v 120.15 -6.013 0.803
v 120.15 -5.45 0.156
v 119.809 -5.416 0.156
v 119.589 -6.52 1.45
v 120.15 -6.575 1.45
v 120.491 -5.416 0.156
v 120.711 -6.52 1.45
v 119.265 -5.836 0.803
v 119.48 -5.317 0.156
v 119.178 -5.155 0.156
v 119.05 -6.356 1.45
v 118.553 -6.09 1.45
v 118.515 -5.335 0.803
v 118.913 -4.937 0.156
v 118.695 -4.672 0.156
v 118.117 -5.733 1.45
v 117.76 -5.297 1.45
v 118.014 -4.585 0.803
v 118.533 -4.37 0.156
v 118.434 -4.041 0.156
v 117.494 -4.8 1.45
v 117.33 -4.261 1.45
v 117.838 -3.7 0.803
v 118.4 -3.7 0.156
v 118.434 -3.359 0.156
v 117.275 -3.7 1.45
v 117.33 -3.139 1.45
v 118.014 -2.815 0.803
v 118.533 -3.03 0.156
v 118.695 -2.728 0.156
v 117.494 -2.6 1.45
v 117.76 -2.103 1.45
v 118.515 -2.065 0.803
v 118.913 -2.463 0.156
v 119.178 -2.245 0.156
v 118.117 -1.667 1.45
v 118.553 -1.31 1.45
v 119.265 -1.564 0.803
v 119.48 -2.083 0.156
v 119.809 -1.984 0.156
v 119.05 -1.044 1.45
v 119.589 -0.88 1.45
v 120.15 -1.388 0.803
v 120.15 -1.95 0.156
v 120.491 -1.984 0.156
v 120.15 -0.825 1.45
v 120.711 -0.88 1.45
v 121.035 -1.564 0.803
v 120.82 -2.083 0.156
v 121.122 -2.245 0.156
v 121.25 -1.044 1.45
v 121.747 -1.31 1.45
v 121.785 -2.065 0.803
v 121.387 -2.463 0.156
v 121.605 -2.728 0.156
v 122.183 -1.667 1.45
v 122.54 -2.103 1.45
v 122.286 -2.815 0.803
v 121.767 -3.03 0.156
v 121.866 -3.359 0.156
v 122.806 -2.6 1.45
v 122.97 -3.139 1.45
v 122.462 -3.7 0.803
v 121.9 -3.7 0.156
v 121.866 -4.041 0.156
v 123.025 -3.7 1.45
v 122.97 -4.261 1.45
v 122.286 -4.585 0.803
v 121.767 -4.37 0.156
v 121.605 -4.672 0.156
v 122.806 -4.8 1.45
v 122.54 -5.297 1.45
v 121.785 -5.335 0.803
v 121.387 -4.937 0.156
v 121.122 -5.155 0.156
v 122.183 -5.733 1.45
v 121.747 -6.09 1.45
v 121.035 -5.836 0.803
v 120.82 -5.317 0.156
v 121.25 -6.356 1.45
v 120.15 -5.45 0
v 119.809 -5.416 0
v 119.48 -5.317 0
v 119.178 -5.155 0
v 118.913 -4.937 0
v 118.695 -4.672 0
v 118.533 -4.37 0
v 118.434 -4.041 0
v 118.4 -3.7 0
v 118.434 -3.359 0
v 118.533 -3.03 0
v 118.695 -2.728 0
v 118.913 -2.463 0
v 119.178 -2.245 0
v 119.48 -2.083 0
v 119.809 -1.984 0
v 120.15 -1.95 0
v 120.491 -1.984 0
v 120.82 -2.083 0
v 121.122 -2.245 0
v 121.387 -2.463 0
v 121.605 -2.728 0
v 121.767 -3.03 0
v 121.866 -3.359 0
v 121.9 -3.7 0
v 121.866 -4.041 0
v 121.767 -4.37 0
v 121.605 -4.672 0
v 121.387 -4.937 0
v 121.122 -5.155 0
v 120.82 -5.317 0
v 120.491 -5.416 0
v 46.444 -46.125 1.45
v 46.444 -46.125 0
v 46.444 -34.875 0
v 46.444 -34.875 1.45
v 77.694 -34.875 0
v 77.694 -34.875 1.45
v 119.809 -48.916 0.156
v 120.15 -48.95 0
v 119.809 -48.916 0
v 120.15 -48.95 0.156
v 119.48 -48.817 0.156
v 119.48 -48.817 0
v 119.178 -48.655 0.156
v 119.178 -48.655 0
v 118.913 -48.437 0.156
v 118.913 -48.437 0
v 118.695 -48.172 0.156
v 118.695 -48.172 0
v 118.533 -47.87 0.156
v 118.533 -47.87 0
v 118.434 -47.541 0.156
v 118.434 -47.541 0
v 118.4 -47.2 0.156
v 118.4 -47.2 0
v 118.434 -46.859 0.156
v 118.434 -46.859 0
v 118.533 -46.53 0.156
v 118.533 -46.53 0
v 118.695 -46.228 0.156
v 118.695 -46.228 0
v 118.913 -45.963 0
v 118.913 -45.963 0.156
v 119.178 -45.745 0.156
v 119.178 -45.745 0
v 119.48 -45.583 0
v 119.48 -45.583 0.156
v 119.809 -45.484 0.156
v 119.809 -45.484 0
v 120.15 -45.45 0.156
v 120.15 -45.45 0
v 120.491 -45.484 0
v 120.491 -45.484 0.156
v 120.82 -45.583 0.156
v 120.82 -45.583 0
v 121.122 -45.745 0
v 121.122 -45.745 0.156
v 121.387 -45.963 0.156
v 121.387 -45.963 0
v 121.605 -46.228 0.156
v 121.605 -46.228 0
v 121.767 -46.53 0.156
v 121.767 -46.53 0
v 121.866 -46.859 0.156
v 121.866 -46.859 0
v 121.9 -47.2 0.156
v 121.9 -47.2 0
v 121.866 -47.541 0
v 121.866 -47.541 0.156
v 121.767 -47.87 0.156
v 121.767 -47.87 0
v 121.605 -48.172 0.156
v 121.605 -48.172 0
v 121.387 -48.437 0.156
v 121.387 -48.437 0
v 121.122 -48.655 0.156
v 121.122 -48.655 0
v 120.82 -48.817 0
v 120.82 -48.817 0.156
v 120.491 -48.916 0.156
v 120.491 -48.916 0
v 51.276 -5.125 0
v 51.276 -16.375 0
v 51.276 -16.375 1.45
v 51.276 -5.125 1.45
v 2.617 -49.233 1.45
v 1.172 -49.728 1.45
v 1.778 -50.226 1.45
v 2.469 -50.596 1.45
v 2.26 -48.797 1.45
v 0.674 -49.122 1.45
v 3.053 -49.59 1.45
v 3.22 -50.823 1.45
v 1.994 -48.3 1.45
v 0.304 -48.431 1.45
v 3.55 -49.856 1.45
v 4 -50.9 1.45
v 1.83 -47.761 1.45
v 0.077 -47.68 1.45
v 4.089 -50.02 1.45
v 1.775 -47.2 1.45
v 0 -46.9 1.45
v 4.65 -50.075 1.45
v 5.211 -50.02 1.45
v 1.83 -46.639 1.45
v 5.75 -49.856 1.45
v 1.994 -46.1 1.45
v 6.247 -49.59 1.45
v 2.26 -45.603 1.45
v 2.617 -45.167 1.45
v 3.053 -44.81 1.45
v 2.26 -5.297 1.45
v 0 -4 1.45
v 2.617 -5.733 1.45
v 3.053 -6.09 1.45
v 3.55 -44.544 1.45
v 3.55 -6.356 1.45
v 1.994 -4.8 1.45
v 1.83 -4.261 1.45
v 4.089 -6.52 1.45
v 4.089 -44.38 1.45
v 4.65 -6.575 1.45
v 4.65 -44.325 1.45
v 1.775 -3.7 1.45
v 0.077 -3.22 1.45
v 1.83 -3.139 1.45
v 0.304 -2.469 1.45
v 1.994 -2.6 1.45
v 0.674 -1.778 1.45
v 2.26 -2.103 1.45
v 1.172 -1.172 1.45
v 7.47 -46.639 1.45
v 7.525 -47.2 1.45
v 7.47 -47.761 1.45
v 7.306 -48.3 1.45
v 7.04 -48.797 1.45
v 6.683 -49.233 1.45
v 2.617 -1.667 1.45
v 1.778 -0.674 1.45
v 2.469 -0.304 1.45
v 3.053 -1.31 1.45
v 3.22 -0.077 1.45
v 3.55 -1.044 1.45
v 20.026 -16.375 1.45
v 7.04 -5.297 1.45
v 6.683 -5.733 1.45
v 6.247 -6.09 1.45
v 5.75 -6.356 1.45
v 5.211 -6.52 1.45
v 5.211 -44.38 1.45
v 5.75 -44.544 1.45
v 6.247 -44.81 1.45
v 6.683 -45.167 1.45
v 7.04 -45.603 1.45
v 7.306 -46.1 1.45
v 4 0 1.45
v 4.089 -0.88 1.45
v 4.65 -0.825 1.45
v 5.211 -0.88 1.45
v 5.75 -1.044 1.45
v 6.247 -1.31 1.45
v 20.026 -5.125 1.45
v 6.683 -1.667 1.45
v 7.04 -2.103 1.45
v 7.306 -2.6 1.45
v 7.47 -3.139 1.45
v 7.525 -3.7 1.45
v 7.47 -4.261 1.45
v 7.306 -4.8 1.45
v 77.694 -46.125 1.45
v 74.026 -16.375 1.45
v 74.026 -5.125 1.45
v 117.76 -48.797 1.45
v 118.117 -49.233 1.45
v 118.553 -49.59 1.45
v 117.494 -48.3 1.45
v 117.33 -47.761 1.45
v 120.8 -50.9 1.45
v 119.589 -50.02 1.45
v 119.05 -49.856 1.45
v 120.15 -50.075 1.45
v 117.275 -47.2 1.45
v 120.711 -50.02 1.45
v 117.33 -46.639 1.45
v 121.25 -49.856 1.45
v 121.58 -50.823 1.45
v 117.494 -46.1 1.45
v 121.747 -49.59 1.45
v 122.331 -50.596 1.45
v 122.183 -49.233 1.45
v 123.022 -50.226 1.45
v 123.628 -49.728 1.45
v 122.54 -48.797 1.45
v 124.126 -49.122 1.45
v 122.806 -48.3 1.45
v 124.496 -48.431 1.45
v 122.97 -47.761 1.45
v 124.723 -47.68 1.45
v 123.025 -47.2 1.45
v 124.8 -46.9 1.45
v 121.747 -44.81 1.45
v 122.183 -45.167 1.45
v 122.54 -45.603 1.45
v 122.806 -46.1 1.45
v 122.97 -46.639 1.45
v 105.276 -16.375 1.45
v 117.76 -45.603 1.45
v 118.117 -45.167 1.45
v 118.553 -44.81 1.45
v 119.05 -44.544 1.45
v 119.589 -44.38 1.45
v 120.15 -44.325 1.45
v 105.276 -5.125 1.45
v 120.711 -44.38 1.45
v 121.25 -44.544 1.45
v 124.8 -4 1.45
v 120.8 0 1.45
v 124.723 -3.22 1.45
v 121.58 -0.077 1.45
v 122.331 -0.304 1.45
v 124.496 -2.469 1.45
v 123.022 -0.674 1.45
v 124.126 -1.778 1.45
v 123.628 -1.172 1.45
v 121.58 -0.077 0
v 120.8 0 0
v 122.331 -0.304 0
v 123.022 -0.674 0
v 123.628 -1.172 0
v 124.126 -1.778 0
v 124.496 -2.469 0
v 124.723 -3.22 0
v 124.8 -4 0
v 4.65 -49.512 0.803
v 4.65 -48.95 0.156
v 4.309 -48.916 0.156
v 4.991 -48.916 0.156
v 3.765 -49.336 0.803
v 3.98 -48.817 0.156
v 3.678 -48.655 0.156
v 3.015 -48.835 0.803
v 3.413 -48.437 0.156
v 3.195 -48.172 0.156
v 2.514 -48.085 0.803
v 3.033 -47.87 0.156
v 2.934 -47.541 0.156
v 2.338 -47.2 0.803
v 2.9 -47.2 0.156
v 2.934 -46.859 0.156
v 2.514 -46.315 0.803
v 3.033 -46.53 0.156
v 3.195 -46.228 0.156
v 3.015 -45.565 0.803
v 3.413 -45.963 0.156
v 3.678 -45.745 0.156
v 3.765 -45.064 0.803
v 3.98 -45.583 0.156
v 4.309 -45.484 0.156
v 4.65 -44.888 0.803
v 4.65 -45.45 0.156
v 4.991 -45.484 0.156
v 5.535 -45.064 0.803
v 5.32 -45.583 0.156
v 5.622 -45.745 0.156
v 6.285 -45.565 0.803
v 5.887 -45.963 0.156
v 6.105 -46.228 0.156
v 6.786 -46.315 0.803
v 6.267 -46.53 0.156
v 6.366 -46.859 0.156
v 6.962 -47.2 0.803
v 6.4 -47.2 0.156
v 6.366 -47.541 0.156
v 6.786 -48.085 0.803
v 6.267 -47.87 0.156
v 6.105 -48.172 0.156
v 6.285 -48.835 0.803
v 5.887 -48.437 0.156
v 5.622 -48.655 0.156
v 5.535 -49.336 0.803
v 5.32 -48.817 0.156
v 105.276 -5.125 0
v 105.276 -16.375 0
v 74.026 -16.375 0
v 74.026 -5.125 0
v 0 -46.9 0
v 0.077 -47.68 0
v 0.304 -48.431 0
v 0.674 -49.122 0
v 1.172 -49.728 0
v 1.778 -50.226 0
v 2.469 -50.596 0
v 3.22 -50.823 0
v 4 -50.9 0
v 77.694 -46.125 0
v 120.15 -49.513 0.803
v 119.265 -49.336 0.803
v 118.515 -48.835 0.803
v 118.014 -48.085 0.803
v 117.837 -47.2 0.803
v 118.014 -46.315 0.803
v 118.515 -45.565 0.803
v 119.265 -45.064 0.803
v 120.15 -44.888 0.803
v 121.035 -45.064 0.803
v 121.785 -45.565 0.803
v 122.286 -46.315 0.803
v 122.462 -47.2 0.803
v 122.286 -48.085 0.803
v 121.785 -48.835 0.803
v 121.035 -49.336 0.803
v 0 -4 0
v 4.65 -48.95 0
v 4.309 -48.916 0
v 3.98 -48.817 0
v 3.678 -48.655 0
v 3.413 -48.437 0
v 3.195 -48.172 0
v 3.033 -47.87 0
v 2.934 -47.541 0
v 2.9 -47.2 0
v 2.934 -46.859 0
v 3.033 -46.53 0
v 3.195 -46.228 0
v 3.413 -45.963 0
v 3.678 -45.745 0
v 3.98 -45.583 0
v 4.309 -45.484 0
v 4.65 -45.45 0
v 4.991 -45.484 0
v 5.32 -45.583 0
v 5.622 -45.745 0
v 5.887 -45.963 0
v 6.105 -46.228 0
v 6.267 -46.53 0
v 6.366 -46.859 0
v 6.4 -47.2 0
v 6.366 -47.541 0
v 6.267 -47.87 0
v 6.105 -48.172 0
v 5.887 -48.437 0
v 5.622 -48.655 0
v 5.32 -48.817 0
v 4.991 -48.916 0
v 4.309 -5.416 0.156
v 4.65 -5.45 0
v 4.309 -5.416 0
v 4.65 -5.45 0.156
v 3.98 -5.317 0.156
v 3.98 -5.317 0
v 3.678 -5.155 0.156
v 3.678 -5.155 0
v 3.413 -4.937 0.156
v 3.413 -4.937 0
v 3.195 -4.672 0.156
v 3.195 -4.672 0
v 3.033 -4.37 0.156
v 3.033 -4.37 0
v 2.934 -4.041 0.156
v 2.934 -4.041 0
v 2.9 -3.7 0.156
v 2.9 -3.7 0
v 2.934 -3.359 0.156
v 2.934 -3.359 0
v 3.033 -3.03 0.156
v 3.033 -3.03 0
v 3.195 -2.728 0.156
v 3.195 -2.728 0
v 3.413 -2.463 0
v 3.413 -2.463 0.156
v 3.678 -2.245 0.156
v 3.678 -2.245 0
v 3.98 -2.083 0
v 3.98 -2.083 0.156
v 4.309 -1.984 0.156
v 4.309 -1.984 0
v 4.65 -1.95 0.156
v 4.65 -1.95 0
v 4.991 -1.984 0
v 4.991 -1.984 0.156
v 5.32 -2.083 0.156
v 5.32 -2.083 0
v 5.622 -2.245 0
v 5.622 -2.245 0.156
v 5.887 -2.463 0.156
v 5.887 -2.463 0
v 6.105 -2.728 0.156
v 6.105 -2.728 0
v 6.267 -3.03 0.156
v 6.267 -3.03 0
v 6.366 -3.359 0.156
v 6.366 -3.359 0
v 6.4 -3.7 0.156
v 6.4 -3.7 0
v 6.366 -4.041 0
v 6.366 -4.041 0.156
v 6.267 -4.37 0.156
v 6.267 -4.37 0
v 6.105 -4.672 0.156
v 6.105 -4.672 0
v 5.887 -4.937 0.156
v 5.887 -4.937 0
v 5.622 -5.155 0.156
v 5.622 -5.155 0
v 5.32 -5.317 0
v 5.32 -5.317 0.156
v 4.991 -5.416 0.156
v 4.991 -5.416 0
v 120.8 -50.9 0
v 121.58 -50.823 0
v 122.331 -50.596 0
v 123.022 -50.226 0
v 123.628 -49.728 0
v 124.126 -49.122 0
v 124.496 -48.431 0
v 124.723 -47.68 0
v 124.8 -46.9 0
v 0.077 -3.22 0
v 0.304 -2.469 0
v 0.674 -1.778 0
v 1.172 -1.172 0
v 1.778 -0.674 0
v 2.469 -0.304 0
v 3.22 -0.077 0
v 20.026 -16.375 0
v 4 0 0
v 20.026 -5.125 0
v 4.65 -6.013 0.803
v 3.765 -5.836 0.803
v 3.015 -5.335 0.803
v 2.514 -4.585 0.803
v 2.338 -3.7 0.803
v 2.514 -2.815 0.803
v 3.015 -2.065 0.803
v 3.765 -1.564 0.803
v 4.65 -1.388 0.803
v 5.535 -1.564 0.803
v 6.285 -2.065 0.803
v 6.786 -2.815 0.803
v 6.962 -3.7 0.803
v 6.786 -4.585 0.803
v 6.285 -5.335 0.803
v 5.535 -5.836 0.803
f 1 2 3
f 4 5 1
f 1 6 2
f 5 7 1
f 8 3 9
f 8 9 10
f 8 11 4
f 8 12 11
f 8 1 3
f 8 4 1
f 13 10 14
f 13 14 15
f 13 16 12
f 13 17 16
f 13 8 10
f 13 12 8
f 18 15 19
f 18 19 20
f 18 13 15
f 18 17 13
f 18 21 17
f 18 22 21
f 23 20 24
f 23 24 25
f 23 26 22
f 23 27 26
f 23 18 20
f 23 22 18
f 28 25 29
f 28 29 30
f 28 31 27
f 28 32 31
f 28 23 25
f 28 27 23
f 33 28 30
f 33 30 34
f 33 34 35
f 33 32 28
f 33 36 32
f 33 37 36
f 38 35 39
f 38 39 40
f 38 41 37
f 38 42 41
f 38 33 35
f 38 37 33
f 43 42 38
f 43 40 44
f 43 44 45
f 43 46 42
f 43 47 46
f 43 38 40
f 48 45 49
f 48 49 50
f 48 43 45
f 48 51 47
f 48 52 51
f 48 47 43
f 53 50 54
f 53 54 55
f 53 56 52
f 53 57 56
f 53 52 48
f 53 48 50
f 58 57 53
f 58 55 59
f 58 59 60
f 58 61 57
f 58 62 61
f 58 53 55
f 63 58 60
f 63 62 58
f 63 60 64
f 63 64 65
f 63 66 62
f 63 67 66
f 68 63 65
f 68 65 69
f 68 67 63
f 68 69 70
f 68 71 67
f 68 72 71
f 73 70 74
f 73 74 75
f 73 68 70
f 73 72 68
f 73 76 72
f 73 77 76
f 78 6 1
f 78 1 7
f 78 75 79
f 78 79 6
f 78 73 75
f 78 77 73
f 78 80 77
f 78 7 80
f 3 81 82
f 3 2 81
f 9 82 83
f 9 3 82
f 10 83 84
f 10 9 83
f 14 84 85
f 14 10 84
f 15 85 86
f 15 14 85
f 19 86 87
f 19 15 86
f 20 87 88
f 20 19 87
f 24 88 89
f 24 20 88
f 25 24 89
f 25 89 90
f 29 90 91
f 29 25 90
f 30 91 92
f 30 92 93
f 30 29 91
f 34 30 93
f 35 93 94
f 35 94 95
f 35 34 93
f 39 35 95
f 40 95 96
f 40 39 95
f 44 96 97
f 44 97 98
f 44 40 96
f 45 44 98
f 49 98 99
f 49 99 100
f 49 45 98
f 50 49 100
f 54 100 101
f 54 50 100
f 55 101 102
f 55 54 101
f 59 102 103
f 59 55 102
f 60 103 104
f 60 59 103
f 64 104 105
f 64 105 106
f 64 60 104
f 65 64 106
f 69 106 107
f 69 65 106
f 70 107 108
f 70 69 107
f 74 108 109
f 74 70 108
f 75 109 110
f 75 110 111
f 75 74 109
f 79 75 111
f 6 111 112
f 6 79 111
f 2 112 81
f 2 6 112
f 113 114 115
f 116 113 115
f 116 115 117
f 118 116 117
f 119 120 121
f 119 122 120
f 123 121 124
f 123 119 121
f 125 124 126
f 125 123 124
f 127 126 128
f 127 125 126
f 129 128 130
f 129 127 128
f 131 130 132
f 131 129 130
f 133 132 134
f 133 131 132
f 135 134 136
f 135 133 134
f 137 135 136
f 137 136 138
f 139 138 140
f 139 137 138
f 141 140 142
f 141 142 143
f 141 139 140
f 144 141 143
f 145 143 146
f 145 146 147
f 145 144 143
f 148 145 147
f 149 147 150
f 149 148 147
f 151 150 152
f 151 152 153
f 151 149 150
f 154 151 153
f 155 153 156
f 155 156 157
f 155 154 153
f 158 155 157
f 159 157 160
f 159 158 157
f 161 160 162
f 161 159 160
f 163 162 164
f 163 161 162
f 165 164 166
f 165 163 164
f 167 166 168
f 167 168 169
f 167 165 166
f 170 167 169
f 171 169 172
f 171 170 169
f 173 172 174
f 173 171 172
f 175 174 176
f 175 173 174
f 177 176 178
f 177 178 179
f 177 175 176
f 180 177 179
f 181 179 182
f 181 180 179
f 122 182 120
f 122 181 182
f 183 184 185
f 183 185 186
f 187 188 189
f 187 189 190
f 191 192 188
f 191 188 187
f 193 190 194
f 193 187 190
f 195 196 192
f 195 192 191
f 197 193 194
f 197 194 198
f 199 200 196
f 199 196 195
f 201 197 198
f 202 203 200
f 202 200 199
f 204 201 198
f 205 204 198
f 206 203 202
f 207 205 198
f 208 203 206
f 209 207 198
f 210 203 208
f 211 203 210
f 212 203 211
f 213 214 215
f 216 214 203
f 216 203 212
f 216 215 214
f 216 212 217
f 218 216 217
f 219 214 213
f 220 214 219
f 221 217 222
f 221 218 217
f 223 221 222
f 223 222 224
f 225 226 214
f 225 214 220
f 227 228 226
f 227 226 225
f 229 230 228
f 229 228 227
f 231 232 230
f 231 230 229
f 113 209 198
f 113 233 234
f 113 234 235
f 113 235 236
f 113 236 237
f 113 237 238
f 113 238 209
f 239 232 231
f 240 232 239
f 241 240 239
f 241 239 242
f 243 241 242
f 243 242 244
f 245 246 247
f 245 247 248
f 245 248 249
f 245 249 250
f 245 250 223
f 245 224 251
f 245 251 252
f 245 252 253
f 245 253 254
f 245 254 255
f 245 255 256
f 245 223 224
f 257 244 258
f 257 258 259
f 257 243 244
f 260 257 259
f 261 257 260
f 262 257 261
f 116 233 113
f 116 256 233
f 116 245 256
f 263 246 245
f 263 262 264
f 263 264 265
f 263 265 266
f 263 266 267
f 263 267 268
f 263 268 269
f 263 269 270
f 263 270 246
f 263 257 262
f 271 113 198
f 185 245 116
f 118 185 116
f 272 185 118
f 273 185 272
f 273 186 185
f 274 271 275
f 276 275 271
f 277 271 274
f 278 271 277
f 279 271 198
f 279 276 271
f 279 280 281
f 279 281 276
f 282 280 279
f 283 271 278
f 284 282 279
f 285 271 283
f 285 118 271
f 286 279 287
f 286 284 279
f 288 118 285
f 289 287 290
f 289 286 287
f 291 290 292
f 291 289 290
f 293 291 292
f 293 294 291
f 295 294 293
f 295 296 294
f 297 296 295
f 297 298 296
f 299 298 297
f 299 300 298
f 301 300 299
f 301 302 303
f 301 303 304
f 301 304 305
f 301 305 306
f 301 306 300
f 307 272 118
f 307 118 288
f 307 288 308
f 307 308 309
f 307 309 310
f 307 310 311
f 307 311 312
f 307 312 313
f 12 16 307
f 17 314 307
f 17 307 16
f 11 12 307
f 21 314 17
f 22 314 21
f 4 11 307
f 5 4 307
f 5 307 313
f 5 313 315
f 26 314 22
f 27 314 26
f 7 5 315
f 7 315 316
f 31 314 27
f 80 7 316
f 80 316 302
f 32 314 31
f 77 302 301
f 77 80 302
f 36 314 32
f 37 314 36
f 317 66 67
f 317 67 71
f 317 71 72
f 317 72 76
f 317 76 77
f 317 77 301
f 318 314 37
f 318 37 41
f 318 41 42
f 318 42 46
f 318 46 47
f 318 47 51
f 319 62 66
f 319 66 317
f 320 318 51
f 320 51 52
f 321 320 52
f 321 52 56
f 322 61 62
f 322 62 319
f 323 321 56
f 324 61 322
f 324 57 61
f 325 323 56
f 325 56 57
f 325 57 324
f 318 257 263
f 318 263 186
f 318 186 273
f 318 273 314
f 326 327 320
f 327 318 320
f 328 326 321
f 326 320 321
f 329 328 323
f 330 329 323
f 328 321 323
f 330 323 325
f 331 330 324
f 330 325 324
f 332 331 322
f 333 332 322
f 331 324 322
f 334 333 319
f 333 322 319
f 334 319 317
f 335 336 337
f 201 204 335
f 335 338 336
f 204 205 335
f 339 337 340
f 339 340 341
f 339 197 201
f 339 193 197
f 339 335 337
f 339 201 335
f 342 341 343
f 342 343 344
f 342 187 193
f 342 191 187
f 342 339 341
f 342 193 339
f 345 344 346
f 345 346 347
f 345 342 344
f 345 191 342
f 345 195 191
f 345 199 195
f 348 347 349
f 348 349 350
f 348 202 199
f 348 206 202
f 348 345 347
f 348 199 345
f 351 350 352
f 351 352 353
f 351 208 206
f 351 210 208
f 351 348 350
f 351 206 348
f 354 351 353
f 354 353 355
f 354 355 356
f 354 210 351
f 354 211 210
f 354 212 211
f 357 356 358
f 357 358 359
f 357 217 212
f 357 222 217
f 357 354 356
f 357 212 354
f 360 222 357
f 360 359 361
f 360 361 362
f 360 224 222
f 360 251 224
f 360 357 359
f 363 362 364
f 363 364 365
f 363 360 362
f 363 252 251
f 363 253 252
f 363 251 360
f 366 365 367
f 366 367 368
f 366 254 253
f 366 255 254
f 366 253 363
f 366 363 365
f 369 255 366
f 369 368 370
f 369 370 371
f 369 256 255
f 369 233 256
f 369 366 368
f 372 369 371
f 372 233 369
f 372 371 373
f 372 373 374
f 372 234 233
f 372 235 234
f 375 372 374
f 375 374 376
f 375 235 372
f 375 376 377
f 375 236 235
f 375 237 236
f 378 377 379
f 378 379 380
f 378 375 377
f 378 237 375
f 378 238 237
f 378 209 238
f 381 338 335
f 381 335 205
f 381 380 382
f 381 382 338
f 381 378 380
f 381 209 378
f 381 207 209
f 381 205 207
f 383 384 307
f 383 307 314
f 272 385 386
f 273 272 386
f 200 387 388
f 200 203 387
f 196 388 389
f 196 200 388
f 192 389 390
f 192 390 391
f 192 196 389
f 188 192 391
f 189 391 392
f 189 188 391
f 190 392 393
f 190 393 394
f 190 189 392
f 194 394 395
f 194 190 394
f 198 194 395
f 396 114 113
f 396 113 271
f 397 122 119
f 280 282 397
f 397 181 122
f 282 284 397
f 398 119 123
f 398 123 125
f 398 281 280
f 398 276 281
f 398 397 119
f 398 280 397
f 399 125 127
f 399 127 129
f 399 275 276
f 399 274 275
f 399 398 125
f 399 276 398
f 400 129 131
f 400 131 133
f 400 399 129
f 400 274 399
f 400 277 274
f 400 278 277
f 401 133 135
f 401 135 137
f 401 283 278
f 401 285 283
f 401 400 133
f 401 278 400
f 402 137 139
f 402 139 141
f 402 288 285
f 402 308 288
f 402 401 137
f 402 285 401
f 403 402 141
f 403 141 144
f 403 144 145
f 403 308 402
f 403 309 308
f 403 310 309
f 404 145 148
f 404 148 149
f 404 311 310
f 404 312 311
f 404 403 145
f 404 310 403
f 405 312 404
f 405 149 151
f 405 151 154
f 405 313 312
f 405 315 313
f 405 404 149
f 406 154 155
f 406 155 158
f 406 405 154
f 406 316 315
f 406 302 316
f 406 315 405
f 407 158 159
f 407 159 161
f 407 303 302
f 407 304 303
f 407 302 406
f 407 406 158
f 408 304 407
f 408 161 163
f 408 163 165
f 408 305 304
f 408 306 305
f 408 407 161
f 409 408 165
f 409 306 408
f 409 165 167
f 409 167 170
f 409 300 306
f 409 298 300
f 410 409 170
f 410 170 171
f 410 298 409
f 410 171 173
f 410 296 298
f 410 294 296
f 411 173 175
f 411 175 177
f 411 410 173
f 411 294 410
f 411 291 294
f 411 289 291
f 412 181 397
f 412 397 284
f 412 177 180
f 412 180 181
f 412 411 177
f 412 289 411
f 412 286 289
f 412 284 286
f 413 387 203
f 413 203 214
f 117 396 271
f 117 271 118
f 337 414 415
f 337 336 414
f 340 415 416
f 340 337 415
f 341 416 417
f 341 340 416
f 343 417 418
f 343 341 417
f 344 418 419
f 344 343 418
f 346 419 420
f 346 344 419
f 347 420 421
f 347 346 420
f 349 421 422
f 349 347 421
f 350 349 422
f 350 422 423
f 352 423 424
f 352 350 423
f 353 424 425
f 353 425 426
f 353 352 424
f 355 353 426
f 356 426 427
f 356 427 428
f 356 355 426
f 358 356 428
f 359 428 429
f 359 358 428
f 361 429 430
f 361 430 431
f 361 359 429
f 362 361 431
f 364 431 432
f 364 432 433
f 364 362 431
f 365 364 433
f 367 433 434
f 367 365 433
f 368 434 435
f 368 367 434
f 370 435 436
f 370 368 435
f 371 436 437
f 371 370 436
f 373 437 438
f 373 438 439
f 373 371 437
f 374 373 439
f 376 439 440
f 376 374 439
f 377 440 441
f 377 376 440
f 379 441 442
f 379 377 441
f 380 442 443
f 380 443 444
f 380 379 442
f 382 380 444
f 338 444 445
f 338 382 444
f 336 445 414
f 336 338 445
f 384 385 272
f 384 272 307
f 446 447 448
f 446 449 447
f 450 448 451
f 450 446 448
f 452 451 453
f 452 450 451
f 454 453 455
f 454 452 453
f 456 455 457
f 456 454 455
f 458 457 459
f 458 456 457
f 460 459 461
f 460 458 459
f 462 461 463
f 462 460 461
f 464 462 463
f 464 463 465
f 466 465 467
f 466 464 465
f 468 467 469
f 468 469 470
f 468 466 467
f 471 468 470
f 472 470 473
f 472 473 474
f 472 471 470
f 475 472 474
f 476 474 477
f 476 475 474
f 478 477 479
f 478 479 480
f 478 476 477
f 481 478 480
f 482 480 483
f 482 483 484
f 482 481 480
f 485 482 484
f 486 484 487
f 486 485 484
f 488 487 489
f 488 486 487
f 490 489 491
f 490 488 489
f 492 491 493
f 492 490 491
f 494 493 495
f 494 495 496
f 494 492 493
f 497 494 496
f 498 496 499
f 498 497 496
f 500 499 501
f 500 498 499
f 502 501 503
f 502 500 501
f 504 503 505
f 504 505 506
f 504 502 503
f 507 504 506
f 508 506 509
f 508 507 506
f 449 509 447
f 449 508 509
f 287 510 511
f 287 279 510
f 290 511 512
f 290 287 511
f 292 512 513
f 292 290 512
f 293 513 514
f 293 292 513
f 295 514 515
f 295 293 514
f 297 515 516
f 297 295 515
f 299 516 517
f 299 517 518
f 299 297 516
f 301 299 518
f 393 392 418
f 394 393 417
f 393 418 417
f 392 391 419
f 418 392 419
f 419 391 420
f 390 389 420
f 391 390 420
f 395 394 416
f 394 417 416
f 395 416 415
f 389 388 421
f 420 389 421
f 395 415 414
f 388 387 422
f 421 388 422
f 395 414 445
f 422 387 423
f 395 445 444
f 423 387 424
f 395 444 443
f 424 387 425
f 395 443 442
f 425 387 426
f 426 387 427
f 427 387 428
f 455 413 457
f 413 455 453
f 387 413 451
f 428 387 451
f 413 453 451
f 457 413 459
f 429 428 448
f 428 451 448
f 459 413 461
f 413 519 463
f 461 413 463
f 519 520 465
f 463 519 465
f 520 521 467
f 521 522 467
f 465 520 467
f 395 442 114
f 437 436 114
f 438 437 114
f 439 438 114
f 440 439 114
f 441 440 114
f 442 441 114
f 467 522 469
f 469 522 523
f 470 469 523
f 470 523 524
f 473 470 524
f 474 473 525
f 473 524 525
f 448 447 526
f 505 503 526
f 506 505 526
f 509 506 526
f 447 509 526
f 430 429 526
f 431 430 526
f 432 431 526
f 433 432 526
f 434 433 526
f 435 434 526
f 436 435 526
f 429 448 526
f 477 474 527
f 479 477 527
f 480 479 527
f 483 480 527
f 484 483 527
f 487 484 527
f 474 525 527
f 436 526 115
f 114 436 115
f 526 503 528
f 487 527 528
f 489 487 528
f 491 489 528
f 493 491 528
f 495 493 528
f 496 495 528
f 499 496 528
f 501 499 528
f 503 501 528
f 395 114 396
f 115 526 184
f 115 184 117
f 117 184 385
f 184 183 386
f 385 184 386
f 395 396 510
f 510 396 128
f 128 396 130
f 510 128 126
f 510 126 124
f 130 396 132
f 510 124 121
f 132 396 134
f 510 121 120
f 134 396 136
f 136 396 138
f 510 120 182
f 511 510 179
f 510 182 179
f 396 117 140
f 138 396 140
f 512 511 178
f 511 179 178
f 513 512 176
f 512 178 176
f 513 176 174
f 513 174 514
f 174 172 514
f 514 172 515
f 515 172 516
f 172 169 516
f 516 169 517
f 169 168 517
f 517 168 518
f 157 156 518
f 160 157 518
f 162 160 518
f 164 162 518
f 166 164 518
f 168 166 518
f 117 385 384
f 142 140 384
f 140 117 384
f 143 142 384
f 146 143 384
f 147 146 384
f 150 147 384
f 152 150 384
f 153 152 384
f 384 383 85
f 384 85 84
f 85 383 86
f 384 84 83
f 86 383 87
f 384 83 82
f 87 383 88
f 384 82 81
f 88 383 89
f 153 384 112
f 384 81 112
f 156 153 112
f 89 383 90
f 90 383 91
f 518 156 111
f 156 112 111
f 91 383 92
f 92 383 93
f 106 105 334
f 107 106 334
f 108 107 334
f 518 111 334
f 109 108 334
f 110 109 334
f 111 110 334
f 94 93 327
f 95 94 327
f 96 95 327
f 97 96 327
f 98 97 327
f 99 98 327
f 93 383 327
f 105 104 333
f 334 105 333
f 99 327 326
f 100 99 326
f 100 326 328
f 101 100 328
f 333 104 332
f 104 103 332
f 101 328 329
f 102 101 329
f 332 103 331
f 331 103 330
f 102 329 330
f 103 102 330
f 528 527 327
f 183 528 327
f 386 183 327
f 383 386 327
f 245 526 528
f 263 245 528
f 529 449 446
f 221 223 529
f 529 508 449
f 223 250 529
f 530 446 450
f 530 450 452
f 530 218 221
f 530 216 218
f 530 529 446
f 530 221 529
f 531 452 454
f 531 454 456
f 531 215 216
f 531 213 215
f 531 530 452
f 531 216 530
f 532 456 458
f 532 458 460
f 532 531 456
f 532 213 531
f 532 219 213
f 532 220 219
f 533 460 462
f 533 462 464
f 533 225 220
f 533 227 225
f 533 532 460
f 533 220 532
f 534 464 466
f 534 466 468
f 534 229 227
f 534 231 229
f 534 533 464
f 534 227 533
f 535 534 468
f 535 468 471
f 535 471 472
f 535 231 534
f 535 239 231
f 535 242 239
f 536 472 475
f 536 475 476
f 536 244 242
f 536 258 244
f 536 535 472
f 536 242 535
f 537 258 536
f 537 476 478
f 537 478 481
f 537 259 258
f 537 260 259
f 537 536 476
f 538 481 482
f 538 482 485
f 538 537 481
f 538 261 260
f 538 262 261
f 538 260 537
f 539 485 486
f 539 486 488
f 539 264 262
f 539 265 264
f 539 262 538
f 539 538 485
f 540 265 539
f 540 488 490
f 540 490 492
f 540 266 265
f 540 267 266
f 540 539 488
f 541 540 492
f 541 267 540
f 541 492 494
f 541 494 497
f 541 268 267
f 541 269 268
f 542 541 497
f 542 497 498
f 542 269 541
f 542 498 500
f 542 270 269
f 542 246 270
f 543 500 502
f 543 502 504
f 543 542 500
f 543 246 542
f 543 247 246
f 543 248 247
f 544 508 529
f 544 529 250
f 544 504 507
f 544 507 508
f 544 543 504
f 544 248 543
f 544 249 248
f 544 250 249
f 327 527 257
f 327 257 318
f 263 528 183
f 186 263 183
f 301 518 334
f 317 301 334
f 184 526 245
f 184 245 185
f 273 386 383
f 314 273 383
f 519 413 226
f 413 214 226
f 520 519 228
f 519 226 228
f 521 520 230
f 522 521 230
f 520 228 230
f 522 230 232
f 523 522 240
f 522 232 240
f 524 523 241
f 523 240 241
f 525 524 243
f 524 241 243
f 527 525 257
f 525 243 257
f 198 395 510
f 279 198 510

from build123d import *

# Parameters (mm, degrees)
SKETCH1_W                                      = 124.8
SKETCH1_H                                      = 50.9
BOSS_EXTRUDE1_DEPTH                            = 1.45
CSK_FOR_M3_5_FLAT_HEAD_MACHINE_SCREW1_AT_COUNT = 2
CSK_FOR_M3_5_FLAT_HEAD_MACHINE_SCREW1_AT_PITCH = 115.5
CSK_FOR_M3_5_FLAT_HEAD_MACHINE_SCREW_2_COUNT   = 2
CSK_FOR_M3_5_FLAT_HEAD_MACHINE_SCREW_2_PITCH   = 123.420014584
CSK_FOR_M3_5_FLAT_HEAD_MACHINE_SCREW_3_COUNT   = 2
CSK_FOR_M3_5_FLAT_HEAD_MACHINE_SCREW_3_PITCH   = 43.5
FILLET2_R                                      = 4
SKETCH4_W                                      = 31.25
SKETCH4_H                                      = 11.25
CUT_EXTRUDE1_DEPTH                             = 1.45


with BuildPart() as part:
    # Sketch1 → Boss-Extrude1 (new body)
    with BuildSketch(Plane.XY):
        with Locations((62.4, -25.45)):
            Rectangle(SKETCH1_W, SKETCH1_H)
    extrude(amount=BOSS_EXTRUDE1_DEPTH)

    # Sketch2 → CSK for M3.5 Flat Head Machine Screw1 (revolve, cut)
    with BuildSketch(Plane(origin=(4.65, -3.7, 1.45), x_dir=(0, -1, 0), z_dir=(1, 0, 0))):
        Polygon((0, 0), (0, 1.45), (1.75, 1.45), (1.75, 1.294164458), (2.875, 0), align=None)
    csk_for_m3_5_flat_head_machine_screw1 = revolve(axis=Axis((4.65, -3.7, 7.8), (0, 0, -1)), mode=Mode.SUBTRACT)

    # CSK for M3.5 Flat Head Machine Screw1 at: CSK for M3.5 Flat Head Machine Screw1 ×2
    with Locations(*[(i * CSK_FOR_M3_5_FLAT_HEAD_MACHINE_SCREW1_AT_PITCH, 0, 0) for i in range(1, CSK_FOR_M3_5_FLAT_HEAD_MACHINE_SCREW1_AT_COUNT)]):
        add(csk_for_m3_5_flat_head_machine_screw1, mode=Mode.SUBTRACT)

    # CSK for M3.5 Flat Head Machine Screw 2: CSK for M3.5 Flat Head Machine Screw1 ×2
    with Locations(*[Vector(0.935828766, -0.35245499, 0) * (i * CSK_FOR_M3_5_FLAT_HEAD_MACHINE_SCREW_2_PITCH) for i in range(1, CSK_FOR_M3_5_FLAT_HEAD_MACHINE_SCREW_2_COUNT)]):
        add(csk_for_m3_5_flat_head_machine_screw1, mode=Mode.SUBTRACT)

    # CSK for M3.5 Flat Head Machine Screw 3: CSK for M3.5 Flat Head Machine Screw1 ×2
    with Locations(*[(0, -i * CSK_FOR_M3_5_FLAT_HEAD_MACHINE_SCREW_3_PITCH, 0) for i in range(1, CSK_FOR_M3_5_FLAT_HEAD_MACHINE_SCREW_3_COUNT)]):
        add(csk_for_m3_5_flat_head_machine_screw1, mode=Mode.SUBTRACT)

    # Fillet2
    fillet2_edges = [part.edges().sort_by_distance(p)[0] for p in [
        (0, 0, 0.725),
        (124.8, 0, 0.725),
        (124.8, -50.9, 0.725),
        (0, -50.9, 0.725),
    ]]
    fillet(fillet2_edges, radius=FILLET2_R)

    # Sketch4 → Cut-Extrude1 (cut)
    with BuildSketch(Plane.XY):
        with Locations((35.651, -10.75)):
            Rectangle(SKETCH4_W, SKETCH4_H)
        with Locations((89.651, -10.75)):
            Rectangle(SKETCH4_W, SKETCH4_H)
        with Locations((62.069, -40.5)):
            Rectangle(SKETCH4_W, SKETCH4_H)
    extrude(amount=CUT_EXTRUDE1_DEPTH, mode=Mode.SUBTRACT)


solid = part.part
